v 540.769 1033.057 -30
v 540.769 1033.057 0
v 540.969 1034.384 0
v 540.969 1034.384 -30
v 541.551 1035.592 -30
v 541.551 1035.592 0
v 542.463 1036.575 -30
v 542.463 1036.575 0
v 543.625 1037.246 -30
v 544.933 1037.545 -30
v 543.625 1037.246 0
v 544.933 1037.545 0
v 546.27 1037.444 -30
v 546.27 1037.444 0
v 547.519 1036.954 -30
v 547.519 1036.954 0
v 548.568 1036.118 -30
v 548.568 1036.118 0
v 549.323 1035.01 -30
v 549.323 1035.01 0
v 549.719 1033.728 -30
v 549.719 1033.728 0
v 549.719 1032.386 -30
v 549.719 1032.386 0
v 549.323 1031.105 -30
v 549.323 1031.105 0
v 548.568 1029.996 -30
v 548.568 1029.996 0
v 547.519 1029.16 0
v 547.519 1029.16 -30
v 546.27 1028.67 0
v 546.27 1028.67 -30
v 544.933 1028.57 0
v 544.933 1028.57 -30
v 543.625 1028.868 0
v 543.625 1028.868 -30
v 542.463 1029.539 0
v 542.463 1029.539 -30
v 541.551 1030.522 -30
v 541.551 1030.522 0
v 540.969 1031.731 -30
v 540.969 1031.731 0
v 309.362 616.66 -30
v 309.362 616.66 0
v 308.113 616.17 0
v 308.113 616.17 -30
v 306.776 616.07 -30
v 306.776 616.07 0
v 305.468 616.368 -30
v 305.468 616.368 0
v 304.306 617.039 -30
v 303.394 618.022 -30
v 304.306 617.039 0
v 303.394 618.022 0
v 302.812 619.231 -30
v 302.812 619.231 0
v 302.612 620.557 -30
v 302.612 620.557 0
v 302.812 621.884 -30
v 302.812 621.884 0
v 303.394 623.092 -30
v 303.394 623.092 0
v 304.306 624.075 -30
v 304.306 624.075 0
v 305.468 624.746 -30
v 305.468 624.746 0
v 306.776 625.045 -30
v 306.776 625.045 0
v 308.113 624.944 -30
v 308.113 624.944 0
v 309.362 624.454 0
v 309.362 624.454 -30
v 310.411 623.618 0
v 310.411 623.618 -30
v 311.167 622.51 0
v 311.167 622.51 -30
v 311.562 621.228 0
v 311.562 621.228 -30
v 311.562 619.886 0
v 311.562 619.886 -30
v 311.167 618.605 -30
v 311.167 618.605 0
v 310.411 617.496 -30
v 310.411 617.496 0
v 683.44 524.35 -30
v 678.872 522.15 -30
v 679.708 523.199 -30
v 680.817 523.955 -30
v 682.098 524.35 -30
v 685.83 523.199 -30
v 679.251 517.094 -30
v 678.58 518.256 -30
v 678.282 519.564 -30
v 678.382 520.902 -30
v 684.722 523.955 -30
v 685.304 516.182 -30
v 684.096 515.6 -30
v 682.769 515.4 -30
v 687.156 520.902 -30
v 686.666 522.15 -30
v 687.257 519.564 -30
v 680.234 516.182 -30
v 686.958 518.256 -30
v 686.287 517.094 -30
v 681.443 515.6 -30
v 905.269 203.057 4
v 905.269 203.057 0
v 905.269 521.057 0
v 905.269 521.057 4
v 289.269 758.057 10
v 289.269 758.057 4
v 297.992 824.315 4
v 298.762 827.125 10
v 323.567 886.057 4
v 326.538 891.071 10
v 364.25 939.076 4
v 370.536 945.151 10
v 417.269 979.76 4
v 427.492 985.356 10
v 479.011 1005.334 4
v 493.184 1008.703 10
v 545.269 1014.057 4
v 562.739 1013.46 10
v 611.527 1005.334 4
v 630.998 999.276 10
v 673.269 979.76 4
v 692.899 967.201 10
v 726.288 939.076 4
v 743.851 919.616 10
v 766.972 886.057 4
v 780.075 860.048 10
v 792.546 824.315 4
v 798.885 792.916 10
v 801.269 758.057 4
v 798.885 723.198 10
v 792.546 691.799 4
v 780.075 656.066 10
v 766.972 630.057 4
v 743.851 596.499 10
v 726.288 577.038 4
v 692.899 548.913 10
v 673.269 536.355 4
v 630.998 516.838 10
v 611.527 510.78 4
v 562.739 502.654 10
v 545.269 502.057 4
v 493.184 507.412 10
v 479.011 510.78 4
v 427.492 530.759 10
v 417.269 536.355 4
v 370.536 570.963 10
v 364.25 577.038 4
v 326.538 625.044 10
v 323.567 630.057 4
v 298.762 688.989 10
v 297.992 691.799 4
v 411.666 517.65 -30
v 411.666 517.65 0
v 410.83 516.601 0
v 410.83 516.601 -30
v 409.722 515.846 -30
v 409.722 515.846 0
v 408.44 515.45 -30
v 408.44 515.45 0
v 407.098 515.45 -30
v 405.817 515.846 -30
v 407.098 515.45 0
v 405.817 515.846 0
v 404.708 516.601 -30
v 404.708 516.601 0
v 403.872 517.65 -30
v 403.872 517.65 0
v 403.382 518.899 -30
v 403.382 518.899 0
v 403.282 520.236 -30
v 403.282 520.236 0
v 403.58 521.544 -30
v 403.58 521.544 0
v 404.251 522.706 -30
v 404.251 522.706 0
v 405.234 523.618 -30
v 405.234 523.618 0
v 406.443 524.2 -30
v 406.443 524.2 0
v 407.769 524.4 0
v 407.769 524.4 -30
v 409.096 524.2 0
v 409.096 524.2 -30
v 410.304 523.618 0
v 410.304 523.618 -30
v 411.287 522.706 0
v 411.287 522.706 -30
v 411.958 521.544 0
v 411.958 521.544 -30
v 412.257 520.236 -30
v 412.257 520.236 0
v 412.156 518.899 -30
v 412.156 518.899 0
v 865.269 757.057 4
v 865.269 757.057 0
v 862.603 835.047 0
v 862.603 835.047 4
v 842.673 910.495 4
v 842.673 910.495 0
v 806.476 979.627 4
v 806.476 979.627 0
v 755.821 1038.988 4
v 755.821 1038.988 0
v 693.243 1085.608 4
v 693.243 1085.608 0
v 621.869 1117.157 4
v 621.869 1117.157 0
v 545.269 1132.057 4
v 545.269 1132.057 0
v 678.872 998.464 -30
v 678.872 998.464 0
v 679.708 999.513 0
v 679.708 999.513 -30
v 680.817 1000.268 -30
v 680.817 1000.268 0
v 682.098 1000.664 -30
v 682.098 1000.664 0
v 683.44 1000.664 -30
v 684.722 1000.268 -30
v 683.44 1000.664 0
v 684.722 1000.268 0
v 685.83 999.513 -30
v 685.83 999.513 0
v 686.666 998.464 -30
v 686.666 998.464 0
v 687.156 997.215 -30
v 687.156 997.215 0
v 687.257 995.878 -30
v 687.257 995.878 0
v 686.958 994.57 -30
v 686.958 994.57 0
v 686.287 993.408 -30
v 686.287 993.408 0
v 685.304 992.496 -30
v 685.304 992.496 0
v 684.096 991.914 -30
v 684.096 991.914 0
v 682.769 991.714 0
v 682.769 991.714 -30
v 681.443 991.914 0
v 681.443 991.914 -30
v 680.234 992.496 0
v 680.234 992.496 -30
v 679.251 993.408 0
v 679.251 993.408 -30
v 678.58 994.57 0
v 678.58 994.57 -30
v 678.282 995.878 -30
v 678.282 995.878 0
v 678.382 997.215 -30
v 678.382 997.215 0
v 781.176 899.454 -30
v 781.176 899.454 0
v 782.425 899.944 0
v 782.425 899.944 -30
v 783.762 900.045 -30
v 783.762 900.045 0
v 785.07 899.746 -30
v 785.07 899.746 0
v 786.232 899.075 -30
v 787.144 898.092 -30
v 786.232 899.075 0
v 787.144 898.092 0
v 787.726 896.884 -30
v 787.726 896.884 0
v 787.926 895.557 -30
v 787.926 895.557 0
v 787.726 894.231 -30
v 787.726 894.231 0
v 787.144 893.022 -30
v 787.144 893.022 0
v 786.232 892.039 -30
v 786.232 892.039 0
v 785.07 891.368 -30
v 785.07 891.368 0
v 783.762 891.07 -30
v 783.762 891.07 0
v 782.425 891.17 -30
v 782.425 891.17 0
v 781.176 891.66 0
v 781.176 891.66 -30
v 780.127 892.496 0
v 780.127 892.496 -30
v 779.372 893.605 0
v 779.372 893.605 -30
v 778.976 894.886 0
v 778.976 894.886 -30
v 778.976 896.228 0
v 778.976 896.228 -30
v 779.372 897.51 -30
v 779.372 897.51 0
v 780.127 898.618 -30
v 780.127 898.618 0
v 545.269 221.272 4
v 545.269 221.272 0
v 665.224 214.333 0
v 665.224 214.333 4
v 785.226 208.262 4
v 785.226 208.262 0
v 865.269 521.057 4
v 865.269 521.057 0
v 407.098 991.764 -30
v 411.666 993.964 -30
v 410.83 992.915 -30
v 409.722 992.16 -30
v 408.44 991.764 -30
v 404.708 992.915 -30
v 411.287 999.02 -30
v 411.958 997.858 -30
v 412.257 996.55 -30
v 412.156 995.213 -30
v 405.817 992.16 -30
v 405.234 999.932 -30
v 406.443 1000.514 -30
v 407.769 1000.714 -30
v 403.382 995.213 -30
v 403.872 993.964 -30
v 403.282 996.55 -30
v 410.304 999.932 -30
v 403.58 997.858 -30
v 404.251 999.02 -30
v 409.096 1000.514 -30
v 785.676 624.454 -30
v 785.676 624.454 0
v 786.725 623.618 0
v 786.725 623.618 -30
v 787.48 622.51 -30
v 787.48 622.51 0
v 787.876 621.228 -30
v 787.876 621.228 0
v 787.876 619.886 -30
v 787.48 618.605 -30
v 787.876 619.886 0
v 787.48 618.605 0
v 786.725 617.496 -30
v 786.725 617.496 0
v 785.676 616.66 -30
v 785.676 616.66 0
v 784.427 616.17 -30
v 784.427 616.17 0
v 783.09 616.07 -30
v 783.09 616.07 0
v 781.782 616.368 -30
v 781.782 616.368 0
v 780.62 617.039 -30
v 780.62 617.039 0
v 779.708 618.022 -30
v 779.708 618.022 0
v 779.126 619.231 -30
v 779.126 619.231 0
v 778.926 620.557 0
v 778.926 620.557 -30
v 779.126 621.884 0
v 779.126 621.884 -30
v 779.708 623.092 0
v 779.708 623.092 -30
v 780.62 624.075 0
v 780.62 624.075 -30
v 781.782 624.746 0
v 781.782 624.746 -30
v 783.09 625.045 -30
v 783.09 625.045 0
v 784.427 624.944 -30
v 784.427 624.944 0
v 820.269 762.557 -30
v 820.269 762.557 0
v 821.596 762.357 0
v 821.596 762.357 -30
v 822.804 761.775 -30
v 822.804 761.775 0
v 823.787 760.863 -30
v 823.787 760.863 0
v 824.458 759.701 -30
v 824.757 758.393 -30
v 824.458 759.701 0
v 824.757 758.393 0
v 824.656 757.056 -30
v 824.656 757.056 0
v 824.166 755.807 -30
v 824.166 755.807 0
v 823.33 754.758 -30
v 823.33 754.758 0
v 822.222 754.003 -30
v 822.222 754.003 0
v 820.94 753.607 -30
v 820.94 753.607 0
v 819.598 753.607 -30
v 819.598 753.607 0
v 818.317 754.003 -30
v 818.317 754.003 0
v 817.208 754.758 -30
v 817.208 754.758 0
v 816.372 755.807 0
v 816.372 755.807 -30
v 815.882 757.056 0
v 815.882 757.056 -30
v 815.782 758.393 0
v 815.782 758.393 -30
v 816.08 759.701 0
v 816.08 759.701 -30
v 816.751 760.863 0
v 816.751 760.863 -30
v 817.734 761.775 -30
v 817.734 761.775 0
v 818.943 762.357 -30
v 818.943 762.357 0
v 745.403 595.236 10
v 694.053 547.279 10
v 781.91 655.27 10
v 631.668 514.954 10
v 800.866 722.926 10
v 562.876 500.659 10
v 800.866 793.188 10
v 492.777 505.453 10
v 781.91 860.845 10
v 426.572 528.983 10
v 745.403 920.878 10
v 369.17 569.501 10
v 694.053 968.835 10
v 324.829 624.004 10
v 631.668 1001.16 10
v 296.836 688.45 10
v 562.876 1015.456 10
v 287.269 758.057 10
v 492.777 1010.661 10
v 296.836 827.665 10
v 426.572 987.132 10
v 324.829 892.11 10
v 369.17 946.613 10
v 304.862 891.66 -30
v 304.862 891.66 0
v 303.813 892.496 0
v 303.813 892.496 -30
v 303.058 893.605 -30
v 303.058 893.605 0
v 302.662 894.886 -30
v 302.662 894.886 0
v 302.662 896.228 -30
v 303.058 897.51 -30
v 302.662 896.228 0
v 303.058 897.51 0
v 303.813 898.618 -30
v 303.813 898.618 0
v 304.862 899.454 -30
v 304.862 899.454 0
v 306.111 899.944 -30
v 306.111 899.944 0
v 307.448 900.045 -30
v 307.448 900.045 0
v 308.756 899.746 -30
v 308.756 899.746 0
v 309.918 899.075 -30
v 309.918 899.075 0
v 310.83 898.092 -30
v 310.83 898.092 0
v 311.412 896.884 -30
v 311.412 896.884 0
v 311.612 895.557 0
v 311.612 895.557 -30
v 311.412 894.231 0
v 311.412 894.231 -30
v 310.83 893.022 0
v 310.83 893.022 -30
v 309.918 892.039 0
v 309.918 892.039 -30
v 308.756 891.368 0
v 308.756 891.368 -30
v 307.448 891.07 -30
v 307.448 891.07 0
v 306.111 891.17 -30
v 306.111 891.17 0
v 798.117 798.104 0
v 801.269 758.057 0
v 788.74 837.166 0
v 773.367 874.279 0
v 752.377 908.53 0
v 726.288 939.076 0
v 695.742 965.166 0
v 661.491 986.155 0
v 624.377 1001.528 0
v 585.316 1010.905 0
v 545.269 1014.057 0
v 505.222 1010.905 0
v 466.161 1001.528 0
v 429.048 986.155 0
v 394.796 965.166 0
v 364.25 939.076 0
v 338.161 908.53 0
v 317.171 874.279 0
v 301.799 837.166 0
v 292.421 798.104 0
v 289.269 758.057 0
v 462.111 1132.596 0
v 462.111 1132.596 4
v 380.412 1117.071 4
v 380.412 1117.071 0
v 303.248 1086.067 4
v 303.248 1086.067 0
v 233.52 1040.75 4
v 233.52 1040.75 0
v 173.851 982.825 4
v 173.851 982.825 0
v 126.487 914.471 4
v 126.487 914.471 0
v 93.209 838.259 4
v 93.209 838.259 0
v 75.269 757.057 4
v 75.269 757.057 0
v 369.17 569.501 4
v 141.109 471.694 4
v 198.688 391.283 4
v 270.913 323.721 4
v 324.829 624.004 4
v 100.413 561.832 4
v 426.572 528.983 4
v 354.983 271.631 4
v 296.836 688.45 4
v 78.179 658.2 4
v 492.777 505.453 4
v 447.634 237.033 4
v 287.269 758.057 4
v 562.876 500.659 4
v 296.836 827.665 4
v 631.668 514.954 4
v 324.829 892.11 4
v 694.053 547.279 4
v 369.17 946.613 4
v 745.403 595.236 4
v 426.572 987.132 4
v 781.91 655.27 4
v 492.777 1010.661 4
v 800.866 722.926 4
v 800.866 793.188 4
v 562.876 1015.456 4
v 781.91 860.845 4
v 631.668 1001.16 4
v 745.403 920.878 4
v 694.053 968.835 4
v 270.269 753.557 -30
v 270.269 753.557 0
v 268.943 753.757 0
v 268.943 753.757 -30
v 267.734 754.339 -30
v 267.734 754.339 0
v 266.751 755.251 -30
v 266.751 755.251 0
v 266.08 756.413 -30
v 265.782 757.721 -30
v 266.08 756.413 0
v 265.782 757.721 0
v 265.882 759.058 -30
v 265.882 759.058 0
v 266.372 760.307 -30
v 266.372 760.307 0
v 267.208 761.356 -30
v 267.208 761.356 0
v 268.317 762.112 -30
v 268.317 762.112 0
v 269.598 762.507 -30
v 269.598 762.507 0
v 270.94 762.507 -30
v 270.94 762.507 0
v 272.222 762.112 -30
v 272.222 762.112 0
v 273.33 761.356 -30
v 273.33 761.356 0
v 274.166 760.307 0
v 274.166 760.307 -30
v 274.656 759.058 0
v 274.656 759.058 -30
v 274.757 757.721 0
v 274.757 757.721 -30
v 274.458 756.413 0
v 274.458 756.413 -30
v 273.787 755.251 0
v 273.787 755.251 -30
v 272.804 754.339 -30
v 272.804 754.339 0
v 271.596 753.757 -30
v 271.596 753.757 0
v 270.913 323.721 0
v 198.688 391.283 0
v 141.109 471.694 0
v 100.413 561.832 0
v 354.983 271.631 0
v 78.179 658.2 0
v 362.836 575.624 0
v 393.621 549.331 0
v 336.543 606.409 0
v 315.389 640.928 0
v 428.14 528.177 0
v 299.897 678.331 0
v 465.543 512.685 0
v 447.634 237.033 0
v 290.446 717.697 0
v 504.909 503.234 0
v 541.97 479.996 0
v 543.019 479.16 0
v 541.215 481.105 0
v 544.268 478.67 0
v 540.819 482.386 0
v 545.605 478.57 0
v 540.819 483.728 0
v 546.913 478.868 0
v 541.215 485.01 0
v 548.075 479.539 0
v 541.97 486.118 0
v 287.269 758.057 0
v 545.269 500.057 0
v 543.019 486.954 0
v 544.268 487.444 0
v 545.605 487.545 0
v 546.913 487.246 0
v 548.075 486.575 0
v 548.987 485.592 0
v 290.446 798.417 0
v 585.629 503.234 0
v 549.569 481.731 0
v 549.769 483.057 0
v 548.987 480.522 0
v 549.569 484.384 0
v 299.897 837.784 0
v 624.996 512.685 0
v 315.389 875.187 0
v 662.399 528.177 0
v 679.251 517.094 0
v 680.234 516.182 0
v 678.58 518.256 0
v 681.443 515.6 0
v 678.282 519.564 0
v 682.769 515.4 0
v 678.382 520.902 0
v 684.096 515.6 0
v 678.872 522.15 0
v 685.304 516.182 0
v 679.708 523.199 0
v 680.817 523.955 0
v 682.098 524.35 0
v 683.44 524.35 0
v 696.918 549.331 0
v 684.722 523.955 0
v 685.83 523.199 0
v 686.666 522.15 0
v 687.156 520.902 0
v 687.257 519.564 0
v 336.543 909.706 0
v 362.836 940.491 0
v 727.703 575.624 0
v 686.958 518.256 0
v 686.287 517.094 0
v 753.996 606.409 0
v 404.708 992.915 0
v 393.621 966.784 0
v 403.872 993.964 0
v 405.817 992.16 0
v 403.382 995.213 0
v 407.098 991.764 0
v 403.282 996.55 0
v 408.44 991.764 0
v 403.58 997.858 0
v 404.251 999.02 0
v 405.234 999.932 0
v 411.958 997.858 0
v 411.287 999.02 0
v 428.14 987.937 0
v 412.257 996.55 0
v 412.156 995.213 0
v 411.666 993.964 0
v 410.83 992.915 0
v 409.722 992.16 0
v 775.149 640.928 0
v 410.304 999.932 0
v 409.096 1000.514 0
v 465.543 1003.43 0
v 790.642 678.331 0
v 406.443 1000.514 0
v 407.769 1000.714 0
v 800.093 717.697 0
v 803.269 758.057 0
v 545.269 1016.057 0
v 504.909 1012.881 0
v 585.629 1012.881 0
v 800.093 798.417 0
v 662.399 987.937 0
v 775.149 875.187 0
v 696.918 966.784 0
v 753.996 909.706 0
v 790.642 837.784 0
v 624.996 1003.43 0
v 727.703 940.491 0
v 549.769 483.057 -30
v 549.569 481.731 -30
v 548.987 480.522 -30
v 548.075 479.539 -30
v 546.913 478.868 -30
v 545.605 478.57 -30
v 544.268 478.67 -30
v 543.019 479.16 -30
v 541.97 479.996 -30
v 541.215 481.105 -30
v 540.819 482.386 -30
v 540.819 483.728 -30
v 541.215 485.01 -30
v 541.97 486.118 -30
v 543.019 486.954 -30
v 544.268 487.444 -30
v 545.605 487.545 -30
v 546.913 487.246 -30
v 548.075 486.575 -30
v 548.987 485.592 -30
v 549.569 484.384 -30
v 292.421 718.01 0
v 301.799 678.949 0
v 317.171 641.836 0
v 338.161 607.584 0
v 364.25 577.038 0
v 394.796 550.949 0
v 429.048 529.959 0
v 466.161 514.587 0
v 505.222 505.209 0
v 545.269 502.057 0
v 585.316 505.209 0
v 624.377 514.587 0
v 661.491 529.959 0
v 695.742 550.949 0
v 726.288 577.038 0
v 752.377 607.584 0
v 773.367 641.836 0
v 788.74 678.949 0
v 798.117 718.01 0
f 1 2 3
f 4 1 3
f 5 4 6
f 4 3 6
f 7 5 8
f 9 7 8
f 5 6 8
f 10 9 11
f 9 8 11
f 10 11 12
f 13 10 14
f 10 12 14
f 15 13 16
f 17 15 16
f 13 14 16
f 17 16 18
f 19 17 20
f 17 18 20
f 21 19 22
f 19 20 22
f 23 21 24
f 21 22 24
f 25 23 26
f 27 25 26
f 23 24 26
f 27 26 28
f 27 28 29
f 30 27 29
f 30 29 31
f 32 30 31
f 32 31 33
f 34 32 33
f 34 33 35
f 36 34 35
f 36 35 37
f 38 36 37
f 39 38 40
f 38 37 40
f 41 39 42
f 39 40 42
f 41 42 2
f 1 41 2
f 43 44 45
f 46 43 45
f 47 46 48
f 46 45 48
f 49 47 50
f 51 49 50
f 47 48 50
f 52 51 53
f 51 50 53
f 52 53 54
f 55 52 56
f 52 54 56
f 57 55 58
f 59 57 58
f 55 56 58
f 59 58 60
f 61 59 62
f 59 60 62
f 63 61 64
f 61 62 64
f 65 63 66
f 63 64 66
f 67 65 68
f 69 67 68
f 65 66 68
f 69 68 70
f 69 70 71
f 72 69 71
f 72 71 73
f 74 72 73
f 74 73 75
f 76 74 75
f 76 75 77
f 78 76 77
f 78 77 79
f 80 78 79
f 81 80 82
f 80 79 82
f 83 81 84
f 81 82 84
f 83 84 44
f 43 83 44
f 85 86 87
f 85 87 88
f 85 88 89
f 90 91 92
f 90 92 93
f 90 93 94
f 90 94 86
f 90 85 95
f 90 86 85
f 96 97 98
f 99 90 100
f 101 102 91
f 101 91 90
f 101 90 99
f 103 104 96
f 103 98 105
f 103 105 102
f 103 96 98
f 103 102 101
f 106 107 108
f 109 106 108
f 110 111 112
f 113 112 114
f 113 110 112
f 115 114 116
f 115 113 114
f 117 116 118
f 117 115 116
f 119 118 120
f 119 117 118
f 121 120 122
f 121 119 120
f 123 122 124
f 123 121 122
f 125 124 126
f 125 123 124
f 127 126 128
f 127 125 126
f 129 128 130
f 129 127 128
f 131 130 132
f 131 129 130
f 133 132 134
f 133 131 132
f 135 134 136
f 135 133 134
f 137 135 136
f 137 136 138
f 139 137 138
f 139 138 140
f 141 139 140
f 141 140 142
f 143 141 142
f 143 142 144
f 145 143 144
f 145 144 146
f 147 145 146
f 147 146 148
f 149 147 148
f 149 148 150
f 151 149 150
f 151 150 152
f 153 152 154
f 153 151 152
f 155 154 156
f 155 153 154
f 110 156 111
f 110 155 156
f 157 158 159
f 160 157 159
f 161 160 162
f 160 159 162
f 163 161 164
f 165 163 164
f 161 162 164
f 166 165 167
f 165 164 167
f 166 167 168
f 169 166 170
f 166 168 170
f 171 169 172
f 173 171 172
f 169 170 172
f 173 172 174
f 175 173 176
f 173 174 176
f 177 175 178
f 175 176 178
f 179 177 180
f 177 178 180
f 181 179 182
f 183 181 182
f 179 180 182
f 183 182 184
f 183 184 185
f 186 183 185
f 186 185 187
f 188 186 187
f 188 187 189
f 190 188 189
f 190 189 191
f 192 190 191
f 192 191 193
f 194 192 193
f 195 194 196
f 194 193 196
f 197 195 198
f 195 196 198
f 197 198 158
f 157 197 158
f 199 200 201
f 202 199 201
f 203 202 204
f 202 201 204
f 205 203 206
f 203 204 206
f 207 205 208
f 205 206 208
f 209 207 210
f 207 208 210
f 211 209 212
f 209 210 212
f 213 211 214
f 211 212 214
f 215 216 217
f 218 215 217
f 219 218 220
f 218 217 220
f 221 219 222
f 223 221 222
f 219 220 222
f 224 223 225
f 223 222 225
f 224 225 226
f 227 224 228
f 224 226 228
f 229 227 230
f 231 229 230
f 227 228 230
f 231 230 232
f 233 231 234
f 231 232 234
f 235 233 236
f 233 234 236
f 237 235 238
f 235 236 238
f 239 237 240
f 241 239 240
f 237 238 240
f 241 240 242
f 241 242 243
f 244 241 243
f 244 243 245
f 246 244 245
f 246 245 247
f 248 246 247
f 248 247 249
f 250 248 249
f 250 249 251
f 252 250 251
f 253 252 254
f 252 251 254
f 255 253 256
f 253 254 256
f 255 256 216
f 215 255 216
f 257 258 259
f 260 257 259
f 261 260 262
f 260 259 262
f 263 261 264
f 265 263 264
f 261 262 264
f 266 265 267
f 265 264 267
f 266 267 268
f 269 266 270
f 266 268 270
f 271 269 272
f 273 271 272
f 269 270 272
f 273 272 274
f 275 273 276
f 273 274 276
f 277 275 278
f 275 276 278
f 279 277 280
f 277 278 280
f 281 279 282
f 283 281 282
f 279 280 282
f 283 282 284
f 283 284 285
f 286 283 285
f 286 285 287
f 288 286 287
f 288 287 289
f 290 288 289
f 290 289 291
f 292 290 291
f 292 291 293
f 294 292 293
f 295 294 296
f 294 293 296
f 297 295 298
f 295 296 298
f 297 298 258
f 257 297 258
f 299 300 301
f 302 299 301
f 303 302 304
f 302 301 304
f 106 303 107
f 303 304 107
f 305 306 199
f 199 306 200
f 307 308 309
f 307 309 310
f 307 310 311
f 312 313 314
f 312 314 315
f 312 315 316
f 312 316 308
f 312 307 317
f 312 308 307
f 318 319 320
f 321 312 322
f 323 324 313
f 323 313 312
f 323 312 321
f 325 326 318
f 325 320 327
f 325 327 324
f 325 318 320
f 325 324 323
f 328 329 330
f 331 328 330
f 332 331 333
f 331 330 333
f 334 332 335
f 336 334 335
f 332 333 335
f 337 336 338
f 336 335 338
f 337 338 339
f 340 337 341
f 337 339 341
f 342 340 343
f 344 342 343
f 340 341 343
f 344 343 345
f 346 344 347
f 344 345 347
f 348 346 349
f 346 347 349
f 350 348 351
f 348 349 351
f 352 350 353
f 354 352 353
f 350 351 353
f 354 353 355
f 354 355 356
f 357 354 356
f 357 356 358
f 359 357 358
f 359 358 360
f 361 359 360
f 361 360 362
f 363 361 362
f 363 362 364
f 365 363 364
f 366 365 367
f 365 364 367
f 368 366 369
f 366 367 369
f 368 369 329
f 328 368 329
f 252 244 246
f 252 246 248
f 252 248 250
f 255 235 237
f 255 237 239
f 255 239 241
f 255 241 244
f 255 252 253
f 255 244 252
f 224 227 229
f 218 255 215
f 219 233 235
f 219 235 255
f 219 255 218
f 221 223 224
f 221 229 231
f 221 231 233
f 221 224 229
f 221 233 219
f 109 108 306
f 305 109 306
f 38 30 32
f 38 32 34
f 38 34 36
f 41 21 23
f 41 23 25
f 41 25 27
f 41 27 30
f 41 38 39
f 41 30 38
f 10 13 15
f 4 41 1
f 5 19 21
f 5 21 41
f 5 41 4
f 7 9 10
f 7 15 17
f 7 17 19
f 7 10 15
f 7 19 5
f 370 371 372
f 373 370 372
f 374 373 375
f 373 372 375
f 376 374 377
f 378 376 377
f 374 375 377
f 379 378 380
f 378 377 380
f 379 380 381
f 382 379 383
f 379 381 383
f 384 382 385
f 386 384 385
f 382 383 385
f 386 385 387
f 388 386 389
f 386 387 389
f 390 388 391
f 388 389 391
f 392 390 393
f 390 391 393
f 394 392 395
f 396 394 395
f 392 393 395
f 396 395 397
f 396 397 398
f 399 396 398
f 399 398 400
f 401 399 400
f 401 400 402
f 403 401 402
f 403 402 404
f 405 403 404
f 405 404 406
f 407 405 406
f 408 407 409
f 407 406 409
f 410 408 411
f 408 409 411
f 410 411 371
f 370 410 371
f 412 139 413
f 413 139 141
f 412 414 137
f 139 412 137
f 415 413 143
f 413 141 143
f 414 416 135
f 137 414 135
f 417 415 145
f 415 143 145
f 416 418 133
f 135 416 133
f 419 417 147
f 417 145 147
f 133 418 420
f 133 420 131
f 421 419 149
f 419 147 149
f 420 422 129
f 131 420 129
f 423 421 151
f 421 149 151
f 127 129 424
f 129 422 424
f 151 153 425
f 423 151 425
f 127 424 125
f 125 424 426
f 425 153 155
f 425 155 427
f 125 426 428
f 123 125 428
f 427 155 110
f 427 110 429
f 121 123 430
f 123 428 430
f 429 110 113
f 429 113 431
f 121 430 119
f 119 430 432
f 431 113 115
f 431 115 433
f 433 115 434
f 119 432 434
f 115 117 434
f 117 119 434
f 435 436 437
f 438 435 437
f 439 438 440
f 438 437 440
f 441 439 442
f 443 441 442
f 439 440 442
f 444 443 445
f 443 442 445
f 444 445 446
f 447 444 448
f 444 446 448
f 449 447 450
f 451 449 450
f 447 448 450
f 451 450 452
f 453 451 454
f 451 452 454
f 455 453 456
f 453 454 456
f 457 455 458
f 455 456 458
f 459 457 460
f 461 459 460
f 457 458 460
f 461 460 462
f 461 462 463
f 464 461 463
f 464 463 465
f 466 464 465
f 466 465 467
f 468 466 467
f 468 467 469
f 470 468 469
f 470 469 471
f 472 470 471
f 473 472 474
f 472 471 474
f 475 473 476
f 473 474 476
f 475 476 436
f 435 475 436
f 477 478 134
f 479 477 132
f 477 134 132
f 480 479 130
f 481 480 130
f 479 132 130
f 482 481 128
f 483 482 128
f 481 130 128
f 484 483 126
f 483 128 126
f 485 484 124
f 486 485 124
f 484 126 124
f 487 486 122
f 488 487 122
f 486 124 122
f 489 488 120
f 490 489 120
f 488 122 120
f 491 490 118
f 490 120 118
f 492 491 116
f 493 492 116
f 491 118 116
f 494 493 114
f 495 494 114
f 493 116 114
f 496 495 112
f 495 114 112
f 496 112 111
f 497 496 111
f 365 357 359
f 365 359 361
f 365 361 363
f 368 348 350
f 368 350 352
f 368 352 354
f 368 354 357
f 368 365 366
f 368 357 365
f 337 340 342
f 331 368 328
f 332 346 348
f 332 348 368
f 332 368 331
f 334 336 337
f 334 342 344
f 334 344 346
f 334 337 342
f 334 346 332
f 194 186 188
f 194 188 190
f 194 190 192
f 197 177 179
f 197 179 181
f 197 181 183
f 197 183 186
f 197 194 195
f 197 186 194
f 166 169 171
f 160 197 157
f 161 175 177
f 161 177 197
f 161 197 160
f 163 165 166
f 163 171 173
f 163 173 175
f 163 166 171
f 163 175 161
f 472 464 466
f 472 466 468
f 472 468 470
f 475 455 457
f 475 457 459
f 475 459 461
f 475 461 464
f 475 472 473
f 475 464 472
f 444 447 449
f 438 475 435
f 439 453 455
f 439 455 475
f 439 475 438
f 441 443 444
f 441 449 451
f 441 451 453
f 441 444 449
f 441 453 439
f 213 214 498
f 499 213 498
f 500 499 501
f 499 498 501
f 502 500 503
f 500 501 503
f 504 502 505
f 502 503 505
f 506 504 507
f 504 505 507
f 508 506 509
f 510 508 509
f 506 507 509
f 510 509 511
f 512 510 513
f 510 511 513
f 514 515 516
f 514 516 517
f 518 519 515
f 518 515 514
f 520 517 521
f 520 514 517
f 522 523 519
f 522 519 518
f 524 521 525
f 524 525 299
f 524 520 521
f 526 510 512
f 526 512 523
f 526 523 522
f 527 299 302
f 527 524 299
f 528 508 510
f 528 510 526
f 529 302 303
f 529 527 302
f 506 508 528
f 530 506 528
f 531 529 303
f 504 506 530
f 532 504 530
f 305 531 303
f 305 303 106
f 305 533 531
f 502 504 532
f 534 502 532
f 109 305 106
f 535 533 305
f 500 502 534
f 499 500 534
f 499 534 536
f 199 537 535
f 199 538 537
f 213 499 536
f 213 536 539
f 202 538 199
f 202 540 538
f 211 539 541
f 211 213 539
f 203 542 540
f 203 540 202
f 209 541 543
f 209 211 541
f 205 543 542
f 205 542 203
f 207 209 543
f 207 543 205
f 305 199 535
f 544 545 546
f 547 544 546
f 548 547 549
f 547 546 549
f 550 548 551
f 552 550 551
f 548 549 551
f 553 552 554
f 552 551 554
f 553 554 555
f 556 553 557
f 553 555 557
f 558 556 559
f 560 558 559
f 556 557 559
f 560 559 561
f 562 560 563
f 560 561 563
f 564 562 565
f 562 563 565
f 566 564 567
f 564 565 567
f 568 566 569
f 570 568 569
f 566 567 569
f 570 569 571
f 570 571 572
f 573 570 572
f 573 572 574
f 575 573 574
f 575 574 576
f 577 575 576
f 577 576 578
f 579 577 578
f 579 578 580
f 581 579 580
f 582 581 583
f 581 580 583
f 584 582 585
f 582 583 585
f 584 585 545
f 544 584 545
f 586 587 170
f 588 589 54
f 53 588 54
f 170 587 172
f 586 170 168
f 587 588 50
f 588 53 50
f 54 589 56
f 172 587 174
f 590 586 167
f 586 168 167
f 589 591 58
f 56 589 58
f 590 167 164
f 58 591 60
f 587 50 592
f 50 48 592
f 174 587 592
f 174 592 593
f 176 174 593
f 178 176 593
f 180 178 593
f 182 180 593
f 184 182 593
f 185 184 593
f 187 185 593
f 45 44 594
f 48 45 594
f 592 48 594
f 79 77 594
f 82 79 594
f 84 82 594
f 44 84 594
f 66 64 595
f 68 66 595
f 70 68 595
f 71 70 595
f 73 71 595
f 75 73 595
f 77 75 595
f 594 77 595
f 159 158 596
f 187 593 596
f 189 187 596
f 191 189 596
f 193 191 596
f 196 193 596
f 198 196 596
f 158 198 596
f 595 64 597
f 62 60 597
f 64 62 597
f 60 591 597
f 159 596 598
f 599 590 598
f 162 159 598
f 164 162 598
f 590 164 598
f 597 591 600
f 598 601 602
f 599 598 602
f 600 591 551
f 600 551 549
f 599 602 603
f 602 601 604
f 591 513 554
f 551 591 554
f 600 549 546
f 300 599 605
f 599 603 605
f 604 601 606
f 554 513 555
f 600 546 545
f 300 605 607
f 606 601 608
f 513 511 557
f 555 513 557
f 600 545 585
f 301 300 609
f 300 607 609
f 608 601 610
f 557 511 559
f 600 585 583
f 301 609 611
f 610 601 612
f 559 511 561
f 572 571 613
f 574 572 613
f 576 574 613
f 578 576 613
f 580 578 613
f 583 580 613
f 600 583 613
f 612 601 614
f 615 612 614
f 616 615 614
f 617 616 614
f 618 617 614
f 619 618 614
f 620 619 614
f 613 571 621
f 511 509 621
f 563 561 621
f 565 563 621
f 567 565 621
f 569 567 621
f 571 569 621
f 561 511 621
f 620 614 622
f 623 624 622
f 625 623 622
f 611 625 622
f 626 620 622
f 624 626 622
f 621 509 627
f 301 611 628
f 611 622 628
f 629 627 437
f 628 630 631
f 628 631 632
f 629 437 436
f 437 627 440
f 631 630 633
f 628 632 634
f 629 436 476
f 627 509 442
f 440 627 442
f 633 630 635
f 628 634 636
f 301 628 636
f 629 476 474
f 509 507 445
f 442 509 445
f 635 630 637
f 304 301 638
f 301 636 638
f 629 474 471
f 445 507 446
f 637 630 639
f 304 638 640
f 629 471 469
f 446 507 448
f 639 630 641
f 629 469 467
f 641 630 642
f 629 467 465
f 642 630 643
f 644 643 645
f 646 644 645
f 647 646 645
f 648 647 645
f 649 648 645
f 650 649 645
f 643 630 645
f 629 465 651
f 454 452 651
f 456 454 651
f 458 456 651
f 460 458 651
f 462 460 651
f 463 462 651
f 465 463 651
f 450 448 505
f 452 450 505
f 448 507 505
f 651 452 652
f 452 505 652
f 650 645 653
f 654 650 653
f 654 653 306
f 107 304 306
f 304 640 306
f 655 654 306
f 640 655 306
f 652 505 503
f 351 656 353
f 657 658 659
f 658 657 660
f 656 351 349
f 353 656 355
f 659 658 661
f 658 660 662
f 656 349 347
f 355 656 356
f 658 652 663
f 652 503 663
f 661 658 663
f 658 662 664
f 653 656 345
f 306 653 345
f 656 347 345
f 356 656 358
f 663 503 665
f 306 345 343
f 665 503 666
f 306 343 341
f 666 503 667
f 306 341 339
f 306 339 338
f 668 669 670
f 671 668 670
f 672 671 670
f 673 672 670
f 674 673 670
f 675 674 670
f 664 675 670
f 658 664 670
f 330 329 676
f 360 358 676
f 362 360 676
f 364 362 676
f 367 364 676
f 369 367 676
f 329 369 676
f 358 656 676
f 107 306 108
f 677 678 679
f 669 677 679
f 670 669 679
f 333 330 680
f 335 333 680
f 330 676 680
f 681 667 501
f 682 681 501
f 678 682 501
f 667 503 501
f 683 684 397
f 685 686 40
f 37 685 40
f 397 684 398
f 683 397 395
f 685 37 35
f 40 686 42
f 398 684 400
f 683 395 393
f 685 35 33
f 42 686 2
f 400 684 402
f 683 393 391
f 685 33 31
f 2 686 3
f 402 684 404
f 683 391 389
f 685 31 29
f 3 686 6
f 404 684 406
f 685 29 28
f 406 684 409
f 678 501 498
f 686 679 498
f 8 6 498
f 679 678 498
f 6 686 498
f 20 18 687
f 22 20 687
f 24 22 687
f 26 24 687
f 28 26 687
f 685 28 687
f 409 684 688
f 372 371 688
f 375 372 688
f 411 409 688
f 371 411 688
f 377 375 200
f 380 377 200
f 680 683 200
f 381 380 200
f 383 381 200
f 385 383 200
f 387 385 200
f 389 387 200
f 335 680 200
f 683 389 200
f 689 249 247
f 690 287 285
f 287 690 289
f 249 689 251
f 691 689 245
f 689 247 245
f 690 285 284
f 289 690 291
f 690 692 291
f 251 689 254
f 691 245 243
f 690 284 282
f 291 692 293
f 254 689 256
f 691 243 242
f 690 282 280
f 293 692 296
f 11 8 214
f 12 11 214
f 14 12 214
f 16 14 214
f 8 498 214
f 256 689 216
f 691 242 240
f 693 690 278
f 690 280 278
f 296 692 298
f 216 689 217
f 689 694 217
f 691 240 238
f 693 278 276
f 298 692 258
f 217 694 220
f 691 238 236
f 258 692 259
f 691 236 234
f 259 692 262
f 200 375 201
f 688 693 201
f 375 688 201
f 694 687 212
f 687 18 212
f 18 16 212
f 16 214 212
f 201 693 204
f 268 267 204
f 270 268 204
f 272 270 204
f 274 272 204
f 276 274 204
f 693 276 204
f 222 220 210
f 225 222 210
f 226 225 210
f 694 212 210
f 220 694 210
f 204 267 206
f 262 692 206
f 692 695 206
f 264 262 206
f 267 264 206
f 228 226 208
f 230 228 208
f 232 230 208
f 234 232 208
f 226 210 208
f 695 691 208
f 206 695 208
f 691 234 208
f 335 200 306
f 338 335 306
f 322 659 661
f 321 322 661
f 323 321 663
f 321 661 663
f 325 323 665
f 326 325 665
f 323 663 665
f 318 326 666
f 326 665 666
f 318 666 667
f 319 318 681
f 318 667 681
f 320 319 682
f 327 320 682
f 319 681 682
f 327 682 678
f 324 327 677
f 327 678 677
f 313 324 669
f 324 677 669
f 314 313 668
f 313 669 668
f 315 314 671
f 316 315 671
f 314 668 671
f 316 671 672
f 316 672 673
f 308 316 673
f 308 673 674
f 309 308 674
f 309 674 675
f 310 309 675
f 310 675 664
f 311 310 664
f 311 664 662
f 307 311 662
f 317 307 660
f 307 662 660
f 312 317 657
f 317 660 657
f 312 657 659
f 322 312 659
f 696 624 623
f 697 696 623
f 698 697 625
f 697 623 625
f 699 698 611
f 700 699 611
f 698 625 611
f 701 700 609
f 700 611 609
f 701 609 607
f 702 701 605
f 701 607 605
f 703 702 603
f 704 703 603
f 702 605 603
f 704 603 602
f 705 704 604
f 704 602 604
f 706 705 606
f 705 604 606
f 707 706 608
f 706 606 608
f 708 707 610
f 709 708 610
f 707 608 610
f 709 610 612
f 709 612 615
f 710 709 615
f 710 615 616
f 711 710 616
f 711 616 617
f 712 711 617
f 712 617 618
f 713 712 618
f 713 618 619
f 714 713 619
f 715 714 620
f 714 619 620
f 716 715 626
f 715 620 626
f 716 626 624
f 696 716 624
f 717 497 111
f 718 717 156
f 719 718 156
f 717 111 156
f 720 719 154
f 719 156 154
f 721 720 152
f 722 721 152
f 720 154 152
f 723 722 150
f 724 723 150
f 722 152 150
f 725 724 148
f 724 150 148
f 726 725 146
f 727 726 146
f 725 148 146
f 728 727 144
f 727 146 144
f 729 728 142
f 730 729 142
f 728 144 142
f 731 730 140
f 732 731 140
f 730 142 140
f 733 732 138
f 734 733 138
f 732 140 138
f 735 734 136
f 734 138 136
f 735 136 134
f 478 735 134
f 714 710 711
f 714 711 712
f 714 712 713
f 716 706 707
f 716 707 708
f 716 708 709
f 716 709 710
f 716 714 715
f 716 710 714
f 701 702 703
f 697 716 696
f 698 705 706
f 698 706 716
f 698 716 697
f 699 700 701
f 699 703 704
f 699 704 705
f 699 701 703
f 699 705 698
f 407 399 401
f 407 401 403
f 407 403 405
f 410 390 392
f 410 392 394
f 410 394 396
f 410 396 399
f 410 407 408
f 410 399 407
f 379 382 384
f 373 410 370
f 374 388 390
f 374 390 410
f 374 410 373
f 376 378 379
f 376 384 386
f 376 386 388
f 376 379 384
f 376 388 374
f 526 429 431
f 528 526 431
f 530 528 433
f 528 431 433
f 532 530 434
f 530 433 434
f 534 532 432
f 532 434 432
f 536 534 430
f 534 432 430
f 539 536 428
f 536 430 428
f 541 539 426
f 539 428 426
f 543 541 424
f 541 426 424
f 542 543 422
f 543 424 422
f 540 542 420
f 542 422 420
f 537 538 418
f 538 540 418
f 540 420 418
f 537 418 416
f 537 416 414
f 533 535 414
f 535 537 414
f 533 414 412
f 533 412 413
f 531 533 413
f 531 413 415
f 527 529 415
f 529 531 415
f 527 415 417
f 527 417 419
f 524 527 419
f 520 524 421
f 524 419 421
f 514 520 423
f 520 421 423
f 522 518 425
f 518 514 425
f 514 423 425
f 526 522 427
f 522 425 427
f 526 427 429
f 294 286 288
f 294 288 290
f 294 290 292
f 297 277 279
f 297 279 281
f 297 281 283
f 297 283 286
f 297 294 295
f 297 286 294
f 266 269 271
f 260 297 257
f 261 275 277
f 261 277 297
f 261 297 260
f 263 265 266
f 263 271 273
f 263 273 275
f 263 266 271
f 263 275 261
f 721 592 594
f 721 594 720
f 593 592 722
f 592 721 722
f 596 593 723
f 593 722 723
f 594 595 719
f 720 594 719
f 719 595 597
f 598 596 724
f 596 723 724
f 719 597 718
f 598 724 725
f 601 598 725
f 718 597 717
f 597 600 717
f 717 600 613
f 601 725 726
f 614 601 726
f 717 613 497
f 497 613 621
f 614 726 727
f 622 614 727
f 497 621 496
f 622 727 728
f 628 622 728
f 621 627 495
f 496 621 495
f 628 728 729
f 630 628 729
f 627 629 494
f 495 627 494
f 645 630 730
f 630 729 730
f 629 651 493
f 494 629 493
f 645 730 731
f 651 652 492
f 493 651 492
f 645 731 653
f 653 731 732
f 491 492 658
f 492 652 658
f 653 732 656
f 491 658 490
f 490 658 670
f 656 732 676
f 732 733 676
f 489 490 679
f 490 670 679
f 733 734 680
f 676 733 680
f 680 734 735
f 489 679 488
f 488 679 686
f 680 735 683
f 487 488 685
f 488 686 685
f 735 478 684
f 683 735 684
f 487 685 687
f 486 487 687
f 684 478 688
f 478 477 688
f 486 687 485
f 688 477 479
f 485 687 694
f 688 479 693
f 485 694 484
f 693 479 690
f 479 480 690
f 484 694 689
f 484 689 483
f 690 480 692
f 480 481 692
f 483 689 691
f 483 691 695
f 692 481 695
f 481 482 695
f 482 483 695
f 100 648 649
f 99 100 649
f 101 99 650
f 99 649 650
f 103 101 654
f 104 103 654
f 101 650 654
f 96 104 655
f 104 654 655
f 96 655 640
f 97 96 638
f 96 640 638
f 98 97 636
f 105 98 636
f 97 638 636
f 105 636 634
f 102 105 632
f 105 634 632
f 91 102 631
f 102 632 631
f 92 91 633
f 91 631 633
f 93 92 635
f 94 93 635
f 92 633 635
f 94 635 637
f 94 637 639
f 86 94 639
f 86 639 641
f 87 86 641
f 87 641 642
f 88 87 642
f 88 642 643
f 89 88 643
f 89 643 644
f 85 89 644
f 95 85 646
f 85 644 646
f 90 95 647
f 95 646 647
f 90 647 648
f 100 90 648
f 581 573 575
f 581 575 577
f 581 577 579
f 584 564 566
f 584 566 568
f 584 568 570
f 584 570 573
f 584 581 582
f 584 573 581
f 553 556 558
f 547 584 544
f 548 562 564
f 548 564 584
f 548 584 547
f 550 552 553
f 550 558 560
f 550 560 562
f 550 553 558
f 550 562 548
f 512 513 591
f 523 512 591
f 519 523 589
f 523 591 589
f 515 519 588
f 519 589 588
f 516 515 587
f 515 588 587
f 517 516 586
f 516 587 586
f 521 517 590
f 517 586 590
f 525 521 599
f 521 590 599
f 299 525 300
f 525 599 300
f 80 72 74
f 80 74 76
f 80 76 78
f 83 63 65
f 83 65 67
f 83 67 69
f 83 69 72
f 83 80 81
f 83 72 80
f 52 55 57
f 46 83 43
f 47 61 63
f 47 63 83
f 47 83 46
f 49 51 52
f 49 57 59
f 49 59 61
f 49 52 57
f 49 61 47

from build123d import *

# Parameters (mm, degrees)
BOSS_EXTRUDE1_DEPTH = 4
SKETCH2_R           = 256
CUT_EXTRUDE1_DEPTH  = 50
EXTRUDE_THIN1_START = -10
SKETCH3_R           = 258
SKETCH3_R_2         = 256
EXTRUDE_THIN1_DEPTH = 10
SKETCH4_R           = 4.5
BOSS_EXTRUDE2_DEPTH = 30
CIRPATTERN1_COUNT   = 12


with BuildPart() as part:
    # Sketch1 → Boss-Extrude1 (new body)
    with BuildSketch(Plane.XY):
        with BuildLine():
            Line((865.269127642, 521.057153497), (865.269127642, 757.057153497))
            ThreePointArc((865.269127642, 757.057153497), (782.812941082, 1010.7278743), (545.269127642, 1132.057153497))
            ThreePointArc((545.269127642, 1132.057153497), (233.519744905, 1040.749713195), (75.269127642, 757.057153497))
            ThreePointArc((75.269127642, 757.057153497), (198.687627947, 391.283260157), (545.269127642, 221.271697797))
            ThreePointArc((545.269127642, 221.271697797), (725.219790584, 211.189307063), (905.269127642, 203.057153497))
            Line((905.269127642, 203.057153497), (905.269127642, 521.057153497))
            Line((905.269127642, 521.057153497), (865.269127642, 521.057153497))
        make_face()
    extrude(amount=BOSS_EXTRUDE1_DEPTH)

    # Sketch2 → Cut-Extrude1 (cut)
    with BuildSketch(Plane.XY.offset(4)):
        with Locations((545.269127642, 758.057153497)):
            Circle(SKETCH2_R)
    extrude(amount=-CUT_EXTRUDE1_DEPTH, mode=Mode.SUBTRACT)

    # Sketch3 → Extrude-Thin1 (add)
    with BuildSketch(Plane(origin=(0, 0, 0), x_dir=(-1, 0, 0), z_dir=(0, 0, -1)).offset(EXTRUDE_THIN1_START)):
        with Locations((-545.269127642, 758.057153497)):
            Circle(SKETCH3_R)
        with Locations((-545.269127642, 758.057153497)):
            Circle(SKETCH3_R_2, mode=Mode.SUBTRACT)
    extrude(amount=EXTRUDE_THIN1_DEPTH)

    # Sketch4 → Boss-Extrude2 (add)
    with BuildSketch(Plane(origin=(0, 0, 0), x_dir=(-1, 0, 0), z_dir=(0, 0, -1))):
        with Locations((-545.269127642, 1033.057153497)):
            Circle(SKETCH4_R)
    boss_extrude2 = extrude(amount=BOSS_EXTRUDE2_DEPTH)

    # CirPattern1: Boss-Extrude2 ×12 about axis
    cirpattern1_axis = Axis((545.269127642, 758.057153497, 0), (0, 0, 1))
    for i in range(1, CIRPATTERN1_COUNT):
        add(boss_extrude2.rotate(cirpattern1_axis, i * 360 / CIRPATTERN1_COUNT))


solid = part.part
